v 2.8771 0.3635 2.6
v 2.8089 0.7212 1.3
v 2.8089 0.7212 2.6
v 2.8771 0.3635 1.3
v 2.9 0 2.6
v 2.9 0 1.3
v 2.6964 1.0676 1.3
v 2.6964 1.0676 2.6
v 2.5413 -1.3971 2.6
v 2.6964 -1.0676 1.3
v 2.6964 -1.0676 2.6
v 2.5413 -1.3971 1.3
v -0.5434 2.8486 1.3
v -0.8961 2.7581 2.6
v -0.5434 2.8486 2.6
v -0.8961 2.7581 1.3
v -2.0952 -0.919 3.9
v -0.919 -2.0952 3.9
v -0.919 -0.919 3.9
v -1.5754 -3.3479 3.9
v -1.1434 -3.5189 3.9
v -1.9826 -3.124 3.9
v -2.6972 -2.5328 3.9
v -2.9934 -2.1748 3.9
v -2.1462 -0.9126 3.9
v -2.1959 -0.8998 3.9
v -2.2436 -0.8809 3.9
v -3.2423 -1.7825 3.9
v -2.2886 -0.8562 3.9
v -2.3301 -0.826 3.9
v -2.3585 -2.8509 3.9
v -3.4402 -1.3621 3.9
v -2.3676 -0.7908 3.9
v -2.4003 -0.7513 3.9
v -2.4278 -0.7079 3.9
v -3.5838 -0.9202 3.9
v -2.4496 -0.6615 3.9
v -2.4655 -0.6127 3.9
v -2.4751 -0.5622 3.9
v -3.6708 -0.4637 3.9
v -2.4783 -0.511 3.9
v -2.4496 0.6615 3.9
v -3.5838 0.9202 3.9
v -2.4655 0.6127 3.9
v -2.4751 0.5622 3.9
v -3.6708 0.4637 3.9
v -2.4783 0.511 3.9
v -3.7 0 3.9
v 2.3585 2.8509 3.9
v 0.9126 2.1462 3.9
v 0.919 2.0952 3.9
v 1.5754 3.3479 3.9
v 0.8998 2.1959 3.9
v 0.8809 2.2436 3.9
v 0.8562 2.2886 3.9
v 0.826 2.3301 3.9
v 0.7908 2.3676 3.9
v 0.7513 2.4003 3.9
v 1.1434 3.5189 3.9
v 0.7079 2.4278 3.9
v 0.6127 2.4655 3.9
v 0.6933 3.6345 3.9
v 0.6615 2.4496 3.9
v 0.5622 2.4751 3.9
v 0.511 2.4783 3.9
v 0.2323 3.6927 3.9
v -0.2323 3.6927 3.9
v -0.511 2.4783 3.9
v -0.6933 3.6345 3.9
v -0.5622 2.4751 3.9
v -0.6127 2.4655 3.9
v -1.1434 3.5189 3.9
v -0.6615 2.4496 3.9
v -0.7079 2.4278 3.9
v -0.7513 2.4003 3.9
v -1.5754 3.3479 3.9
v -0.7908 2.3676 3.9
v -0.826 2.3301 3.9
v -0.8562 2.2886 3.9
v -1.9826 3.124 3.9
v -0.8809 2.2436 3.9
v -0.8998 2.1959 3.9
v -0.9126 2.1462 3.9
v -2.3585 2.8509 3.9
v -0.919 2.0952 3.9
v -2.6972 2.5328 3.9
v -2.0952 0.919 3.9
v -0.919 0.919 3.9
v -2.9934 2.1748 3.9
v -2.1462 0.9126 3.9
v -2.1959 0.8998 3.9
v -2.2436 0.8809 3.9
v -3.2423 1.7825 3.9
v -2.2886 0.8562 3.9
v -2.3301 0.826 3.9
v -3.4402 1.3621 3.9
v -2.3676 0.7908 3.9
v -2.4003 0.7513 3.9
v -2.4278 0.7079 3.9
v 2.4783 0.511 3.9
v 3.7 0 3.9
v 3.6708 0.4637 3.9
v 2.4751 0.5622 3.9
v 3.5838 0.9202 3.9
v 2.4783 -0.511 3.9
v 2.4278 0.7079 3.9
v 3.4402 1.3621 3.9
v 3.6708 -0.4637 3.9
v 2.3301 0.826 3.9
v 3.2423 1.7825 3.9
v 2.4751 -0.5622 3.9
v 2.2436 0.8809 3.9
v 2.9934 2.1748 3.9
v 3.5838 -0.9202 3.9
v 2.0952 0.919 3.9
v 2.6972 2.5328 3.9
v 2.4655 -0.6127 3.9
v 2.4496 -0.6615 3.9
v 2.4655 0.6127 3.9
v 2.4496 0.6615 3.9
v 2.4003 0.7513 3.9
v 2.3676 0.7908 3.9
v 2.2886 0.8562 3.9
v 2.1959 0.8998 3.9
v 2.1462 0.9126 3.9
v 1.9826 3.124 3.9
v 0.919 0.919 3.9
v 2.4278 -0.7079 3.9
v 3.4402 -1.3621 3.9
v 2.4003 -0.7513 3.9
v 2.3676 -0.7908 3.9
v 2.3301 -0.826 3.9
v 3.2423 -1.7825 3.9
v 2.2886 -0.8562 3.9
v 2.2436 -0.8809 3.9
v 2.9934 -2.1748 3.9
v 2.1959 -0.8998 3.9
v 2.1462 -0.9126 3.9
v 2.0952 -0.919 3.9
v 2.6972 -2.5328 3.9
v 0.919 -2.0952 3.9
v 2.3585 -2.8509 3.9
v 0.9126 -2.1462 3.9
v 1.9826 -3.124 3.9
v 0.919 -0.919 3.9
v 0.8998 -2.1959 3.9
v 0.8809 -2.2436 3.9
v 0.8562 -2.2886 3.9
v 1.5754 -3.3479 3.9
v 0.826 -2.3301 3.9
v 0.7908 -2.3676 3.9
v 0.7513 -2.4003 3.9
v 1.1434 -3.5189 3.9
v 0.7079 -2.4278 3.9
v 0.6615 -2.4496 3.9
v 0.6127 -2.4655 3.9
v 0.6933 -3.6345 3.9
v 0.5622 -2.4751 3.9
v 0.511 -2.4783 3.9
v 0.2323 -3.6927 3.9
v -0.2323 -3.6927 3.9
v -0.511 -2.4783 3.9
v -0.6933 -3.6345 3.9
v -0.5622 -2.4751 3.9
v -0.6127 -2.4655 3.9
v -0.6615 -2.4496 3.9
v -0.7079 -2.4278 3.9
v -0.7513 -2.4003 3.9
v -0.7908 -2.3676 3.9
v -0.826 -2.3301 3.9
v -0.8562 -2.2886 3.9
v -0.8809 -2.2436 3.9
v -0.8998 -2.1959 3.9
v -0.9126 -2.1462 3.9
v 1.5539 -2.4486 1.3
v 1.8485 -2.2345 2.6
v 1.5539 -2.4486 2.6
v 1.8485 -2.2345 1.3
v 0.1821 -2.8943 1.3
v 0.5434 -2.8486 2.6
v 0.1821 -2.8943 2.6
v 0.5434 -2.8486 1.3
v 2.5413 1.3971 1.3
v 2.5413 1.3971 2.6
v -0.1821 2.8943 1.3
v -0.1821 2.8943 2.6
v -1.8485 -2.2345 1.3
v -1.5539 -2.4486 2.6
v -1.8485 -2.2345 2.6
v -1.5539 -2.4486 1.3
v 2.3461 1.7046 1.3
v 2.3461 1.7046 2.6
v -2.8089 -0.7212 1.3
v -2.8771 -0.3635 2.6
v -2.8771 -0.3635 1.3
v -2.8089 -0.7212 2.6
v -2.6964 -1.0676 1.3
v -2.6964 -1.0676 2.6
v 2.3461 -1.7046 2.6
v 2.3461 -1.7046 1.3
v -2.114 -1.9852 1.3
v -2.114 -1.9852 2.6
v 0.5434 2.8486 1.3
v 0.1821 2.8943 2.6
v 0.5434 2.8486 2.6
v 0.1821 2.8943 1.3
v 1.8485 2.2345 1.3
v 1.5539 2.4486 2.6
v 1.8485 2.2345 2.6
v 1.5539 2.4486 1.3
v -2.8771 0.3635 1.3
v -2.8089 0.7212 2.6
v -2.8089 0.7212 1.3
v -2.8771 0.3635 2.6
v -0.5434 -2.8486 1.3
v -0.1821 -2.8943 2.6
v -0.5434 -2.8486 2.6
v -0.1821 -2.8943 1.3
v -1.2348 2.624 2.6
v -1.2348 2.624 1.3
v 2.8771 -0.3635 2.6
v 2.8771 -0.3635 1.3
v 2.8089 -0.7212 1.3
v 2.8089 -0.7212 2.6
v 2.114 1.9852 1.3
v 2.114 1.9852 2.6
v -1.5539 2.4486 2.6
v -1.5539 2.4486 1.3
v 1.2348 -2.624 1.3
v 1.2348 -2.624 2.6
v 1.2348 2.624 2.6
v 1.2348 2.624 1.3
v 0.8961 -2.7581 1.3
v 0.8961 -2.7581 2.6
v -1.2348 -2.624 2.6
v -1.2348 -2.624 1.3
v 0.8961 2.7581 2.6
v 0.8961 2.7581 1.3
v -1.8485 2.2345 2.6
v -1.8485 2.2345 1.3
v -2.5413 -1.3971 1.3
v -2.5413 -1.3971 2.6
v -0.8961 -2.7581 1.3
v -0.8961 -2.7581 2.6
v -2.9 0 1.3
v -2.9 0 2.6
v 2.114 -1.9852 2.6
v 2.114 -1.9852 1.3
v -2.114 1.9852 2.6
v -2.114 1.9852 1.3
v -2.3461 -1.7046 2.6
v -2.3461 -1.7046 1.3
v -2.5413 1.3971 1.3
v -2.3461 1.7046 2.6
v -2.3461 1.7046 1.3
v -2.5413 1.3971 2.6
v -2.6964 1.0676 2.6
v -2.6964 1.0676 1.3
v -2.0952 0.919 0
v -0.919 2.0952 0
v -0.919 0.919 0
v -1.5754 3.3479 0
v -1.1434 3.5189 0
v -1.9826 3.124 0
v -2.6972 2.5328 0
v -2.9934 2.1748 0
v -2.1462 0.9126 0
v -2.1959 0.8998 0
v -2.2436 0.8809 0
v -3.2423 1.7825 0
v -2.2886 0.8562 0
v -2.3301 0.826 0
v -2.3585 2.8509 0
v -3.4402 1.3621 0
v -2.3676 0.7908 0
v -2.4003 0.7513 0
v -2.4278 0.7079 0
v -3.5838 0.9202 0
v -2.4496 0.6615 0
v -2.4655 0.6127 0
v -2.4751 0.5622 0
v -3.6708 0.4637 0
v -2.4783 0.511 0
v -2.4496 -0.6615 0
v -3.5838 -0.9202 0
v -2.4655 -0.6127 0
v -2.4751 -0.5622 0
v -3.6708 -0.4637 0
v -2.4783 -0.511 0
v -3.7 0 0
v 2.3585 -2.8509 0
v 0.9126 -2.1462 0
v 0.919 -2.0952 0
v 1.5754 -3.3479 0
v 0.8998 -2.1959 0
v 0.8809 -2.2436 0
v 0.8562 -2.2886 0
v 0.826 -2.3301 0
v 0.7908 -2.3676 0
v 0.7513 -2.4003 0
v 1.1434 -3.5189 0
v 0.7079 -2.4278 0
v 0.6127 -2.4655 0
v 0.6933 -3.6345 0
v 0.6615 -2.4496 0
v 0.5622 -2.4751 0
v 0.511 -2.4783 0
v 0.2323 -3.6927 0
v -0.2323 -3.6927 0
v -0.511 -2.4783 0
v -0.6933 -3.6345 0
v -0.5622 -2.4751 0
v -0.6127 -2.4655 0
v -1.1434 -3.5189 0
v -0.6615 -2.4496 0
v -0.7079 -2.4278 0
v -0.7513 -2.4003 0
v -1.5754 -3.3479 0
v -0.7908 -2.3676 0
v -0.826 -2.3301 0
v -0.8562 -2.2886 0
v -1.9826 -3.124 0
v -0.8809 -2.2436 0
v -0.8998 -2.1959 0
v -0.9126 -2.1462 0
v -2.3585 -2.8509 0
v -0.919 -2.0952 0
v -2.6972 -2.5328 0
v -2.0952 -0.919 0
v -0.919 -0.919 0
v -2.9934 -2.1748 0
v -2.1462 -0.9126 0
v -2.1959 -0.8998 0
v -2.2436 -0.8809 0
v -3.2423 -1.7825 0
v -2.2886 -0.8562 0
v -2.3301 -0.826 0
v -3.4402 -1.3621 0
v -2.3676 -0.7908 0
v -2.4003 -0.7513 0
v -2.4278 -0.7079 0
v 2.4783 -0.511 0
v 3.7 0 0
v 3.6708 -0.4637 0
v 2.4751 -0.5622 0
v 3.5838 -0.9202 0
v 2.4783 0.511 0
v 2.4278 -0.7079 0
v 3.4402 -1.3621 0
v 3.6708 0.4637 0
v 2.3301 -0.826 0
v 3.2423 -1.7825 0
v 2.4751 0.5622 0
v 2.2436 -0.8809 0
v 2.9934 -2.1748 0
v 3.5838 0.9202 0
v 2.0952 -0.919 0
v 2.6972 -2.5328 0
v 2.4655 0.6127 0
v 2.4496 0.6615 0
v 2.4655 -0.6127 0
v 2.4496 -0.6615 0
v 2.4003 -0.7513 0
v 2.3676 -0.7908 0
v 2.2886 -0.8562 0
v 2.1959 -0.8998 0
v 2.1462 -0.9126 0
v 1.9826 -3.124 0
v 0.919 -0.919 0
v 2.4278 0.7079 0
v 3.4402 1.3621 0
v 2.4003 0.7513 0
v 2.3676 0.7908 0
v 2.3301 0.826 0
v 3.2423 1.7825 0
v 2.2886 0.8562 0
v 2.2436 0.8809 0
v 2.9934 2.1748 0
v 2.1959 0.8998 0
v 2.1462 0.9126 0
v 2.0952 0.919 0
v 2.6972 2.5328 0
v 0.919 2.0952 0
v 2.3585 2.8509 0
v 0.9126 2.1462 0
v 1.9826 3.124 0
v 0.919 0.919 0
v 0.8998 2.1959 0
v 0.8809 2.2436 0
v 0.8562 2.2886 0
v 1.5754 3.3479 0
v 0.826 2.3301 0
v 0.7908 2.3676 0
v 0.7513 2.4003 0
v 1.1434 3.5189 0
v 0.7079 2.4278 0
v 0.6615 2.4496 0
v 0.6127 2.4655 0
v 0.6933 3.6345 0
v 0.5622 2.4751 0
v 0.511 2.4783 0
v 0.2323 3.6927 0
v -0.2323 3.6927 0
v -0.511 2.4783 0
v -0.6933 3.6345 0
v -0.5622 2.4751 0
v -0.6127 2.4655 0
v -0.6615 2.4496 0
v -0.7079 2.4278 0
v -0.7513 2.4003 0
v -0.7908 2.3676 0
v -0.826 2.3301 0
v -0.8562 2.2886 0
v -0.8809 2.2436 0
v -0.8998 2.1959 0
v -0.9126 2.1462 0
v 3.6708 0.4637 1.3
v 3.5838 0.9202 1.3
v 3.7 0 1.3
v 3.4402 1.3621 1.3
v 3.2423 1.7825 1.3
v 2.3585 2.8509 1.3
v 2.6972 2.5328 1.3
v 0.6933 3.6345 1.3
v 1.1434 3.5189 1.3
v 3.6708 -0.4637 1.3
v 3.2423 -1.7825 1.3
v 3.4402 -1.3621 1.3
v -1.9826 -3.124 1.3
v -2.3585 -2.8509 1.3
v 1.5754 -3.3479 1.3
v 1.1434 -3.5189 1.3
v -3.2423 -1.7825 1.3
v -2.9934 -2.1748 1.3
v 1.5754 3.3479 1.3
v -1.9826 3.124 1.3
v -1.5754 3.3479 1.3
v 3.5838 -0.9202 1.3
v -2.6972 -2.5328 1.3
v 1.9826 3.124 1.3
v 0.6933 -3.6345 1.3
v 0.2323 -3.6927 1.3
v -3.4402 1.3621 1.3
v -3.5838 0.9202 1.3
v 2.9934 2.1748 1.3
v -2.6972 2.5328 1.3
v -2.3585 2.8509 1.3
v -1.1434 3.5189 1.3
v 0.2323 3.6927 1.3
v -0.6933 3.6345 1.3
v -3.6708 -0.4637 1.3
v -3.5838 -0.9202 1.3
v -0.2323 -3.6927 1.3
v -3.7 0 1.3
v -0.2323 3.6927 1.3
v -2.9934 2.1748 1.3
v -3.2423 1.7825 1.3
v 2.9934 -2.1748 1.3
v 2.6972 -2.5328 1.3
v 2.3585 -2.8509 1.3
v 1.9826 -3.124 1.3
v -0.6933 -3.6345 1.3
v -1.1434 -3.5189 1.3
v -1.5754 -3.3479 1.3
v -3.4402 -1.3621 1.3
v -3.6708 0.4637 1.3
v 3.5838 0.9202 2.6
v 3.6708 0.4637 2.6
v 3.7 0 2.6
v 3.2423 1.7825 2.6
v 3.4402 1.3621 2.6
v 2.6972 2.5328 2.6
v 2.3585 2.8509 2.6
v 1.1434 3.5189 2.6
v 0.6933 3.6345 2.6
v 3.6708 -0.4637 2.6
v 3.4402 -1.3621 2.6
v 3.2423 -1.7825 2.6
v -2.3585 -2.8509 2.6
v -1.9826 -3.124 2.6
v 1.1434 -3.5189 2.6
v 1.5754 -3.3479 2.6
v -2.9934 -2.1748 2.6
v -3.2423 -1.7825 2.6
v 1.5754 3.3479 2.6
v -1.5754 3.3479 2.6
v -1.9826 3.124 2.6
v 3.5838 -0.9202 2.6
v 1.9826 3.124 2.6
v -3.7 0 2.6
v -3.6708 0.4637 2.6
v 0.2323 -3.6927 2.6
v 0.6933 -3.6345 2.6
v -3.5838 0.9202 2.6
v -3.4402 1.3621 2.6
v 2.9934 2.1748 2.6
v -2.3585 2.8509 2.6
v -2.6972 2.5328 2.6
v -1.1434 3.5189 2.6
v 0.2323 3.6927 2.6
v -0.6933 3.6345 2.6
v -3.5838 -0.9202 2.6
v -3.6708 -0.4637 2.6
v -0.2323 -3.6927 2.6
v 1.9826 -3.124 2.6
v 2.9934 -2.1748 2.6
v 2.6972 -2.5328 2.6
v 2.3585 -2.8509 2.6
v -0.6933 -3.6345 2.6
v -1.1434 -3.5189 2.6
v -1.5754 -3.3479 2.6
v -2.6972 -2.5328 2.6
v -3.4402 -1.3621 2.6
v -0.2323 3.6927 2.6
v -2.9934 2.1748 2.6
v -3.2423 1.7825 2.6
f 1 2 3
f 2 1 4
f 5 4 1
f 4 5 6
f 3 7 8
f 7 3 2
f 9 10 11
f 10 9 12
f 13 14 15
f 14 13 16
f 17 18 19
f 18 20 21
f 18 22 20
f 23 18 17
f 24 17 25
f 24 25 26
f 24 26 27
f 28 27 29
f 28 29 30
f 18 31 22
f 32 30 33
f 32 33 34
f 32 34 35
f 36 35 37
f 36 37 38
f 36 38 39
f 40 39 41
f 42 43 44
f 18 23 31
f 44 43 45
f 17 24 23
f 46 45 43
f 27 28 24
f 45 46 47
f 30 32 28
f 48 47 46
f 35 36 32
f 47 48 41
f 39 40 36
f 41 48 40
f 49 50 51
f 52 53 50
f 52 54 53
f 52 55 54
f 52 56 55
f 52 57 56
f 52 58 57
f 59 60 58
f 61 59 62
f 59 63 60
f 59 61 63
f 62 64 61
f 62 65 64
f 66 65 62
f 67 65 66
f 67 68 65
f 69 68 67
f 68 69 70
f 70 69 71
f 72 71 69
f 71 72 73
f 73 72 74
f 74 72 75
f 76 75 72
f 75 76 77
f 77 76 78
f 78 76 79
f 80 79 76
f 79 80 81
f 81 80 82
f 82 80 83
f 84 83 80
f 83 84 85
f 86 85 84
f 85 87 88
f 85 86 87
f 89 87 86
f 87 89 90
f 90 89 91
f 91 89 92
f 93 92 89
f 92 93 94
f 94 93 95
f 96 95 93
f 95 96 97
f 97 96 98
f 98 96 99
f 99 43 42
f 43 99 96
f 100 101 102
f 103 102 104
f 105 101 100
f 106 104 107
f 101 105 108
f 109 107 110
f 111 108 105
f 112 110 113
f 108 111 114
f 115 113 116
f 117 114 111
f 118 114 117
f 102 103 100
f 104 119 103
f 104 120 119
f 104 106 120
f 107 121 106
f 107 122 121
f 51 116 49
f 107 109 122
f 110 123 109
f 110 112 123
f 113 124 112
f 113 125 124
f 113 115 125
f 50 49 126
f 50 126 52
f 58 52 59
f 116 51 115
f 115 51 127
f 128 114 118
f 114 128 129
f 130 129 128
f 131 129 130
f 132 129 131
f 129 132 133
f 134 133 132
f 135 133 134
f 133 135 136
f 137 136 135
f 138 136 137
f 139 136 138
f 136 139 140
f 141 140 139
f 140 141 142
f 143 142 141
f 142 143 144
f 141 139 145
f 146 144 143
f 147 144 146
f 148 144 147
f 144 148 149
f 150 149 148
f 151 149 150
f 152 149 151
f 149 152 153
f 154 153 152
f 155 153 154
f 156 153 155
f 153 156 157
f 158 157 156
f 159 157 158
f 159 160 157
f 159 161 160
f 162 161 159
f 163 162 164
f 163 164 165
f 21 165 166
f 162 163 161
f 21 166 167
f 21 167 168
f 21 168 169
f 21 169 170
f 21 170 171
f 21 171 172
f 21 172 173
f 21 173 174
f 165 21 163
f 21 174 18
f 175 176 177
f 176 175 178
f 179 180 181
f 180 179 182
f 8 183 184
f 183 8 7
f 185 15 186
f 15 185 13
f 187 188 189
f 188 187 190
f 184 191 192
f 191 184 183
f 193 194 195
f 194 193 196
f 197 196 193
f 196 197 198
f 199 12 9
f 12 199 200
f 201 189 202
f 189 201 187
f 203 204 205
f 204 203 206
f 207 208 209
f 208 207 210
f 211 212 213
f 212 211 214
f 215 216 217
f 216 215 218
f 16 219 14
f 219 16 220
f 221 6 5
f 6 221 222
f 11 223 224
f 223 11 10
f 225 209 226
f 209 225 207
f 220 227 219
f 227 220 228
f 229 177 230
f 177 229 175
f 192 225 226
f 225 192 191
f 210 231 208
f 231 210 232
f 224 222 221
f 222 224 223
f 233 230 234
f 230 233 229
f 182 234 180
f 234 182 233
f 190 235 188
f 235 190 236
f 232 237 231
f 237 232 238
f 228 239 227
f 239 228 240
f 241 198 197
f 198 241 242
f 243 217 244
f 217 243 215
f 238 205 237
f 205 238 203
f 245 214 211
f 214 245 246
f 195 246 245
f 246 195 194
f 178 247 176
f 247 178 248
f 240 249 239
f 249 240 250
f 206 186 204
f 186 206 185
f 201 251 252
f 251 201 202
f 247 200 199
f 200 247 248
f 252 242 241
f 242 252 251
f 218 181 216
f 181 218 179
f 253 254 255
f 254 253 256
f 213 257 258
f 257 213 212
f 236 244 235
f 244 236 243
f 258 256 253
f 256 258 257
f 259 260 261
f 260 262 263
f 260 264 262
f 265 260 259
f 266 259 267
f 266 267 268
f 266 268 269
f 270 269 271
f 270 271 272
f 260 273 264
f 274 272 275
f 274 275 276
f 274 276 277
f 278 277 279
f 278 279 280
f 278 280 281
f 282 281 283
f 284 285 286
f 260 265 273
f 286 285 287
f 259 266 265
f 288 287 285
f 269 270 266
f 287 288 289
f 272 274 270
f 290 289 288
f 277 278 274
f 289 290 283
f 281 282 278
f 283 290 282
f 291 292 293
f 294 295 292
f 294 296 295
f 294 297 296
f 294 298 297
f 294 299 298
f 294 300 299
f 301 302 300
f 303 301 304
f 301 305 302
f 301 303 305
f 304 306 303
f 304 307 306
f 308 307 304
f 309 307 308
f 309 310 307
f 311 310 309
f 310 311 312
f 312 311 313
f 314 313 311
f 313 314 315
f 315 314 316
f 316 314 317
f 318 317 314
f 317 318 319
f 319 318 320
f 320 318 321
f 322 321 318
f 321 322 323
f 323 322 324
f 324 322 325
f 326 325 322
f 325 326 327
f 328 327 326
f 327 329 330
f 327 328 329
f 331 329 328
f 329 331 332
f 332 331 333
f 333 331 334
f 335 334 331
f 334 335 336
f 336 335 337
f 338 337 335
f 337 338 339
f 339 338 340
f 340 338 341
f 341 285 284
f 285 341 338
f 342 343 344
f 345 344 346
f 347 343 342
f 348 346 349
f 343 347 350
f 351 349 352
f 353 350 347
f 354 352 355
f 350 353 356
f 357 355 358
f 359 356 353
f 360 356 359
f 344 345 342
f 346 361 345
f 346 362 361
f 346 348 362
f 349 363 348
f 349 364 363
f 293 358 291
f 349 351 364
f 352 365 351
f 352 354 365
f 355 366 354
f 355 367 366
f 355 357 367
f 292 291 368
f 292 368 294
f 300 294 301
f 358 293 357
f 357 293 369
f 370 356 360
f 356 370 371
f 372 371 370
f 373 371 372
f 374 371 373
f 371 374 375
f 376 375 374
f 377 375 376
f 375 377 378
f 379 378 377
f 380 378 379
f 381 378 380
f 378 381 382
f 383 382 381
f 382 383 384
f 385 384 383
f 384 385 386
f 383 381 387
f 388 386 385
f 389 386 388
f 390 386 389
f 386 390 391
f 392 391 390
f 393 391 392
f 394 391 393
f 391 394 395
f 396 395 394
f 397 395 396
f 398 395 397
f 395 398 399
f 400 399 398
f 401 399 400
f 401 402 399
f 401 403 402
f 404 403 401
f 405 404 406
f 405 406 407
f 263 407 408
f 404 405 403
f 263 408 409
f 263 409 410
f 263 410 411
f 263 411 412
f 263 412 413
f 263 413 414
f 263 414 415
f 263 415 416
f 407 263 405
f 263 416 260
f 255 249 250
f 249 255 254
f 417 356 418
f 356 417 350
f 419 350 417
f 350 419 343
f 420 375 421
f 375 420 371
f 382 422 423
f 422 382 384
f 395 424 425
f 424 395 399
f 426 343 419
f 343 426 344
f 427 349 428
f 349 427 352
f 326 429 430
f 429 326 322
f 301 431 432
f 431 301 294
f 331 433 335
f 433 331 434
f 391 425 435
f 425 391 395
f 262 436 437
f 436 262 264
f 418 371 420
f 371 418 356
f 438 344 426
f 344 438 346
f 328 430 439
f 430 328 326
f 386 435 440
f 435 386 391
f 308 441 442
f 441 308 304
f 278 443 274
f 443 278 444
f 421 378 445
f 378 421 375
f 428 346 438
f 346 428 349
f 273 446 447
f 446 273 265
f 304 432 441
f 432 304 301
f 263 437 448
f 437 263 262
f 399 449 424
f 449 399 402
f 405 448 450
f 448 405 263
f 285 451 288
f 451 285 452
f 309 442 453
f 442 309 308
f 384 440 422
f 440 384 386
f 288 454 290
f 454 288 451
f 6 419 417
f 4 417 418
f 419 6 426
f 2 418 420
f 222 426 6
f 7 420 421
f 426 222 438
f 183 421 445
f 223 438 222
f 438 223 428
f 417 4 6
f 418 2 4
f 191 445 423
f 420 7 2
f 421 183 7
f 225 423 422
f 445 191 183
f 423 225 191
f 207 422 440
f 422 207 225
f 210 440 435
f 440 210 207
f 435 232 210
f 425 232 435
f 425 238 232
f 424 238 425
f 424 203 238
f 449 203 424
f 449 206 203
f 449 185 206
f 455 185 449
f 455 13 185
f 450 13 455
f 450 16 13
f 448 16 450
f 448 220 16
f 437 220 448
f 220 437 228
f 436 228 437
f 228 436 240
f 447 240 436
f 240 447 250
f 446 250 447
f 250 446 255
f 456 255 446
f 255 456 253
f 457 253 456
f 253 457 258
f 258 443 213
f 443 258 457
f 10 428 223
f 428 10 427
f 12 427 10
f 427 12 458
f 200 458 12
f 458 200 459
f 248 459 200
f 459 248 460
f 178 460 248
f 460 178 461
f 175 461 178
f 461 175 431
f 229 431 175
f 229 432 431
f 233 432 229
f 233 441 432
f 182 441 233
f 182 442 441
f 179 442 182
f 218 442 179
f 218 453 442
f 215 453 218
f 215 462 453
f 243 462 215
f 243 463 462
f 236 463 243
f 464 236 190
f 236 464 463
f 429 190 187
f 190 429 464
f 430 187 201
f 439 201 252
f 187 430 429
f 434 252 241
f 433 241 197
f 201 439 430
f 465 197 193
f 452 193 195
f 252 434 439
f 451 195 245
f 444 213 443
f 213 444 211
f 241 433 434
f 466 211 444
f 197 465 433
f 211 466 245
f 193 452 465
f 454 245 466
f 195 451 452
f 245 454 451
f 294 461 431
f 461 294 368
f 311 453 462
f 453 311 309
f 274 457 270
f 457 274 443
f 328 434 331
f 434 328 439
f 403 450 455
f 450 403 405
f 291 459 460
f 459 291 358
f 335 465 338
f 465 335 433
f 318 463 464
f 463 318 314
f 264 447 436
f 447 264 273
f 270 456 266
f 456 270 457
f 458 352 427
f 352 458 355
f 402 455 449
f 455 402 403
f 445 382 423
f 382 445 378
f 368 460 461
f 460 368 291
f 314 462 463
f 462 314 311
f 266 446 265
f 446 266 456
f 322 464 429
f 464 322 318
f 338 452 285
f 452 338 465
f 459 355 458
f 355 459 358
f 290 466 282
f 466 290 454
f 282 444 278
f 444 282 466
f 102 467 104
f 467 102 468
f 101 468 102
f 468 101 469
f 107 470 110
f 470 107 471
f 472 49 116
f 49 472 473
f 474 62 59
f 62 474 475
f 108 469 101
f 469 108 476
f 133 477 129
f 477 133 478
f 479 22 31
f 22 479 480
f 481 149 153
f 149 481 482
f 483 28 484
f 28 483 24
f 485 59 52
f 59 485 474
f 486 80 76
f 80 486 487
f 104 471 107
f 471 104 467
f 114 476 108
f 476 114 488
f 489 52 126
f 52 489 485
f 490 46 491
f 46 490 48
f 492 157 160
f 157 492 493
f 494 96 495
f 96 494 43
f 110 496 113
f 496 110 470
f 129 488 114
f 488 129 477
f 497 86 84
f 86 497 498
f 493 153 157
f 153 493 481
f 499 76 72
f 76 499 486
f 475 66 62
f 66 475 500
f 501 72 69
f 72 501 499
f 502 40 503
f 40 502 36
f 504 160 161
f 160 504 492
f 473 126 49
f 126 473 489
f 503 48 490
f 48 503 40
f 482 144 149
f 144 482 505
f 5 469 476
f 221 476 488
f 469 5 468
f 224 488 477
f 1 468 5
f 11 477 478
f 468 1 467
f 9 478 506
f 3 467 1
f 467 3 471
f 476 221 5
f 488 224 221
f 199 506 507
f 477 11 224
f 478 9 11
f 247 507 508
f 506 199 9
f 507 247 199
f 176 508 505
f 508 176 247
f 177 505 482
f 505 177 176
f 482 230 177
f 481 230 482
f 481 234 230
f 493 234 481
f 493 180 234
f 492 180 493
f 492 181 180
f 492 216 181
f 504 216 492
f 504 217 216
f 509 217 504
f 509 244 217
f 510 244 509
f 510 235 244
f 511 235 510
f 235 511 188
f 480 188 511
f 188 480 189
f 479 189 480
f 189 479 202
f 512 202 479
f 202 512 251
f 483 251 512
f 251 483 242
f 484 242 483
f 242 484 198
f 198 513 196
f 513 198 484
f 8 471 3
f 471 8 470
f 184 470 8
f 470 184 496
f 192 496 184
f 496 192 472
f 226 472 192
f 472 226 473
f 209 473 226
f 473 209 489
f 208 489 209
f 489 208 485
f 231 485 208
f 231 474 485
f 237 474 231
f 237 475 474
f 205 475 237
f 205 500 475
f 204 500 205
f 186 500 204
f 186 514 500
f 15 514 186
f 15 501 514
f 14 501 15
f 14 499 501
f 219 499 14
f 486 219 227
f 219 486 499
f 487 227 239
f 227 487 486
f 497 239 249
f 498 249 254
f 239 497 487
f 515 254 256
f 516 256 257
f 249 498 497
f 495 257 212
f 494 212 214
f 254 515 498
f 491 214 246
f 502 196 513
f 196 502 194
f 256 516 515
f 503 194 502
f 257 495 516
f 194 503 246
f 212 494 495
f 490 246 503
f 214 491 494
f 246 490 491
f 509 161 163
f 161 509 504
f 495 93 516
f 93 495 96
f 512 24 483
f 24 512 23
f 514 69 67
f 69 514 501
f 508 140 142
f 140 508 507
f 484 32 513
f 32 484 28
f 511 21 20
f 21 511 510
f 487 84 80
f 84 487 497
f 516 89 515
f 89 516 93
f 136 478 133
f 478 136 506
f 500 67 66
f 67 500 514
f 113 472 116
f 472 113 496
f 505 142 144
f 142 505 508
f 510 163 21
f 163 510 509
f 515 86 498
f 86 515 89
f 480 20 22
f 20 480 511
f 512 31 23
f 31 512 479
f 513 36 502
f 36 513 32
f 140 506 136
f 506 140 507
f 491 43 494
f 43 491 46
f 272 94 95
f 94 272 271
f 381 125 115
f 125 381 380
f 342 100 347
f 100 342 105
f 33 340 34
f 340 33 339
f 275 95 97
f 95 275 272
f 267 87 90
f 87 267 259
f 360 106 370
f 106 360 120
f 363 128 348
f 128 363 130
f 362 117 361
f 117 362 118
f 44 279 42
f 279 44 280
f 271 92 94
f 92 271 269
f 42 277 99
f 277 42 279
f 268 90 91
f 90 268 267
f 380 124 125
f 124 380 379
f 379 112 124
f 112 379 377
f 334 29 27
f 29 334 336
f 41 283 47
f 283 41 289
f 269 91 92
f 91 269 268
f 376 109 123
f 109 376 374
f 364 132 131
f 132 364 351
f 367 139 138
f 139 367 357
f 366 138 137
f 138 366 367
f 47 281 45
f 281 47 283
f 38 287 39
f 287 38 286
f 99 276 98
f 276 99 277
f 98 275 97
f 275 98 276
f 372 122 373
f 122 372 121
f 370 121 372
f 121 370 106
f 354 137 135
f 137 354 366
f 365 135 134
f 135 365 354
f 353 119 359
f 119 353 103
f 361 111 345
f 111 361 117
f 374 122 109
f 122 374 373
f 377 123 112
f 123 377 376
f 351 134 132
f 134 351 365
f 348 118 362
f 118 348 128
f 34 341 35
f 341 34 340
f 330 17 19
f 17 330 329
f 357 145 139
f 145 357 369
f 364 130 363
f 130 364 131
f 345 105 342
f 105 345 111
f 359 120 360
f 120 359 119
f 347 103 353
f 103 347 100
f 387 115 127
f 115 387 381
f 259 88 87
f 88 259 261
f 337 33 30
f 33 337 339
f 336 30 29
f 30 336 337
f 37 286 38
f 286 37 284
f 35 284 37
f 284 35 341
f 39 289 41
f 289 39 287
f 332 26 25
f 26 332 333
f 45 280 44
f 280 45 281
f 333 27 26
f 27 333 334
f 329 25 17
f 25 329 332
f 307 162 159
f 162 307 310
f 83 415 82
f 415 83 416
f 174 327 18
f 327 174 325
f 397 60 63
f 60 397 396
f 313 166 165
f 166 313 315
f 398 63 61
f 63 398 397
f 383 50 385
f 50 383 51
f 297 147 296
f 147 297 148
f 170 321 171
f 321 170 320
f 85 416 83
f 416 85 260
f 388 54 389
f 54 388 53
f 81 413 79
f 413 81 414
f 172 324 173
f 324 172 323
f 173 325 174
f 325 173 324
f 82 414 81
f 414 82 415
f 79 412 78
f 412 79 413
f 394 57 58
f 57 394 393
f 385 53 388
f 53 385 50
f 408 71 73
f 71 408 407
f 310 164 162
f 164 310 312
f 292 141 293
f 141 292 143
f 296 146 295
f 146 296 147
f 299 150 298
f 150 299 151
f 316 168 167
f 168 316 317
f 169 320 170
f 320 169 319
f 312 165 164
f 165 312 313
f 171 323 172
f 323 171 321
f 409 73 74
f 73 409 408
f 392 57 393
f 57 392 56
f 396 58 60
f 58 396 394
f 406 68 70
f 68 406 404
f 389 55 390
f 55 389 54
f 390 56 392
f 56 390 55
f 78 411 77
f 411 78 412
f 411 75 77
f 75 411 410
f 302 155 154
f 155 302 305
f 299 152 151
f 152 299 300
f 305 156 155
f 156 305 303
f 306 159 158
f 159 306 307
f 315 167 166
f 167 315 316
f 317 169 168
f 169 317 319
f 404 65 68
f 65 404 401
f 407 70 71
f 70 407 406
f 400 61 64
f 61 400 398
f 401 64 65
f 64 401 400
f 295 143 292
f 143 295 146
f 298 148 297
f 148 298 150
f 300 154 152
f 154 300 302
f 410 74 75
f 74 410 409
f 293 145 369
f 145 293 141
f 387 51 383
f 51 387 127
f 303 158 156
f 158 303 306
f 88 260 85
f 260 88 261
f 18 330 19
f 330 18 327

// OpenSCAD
/**
 * LEGO and Technic are trademarks of the LEGO Group.
 *
 * For standard LEGO-compatible bricks, see LEGO.scad. This module
 * is specifically for parts without studs, like gears and axles.
 *
 * Copyright (c) 2025 Christopher Finke (cfinke@gmail.com)
 *
 * Permission is hereby granted, free of charge, to any person obtaining
 * a copy of this software and associated documentation files (the
 * "Software"), to deal in the Software without restriction, including
 * without limitation the rights to use, copy, modify, merge, publish,
 * distribute, sublicense, and/or sell copies of the Software, and to
 * permit persons to whom the Software is furnished to do so, subject to
 * the following conditions:
 *
 * The above copyright notice and this permission notice shall be
 * included in all copies or substantial portions of the Software.
 *
 * THE SOFTWARE IS PROVIDED "AS IS", WITHOUT WARRANTY OF ANY KIND,
 * EXPRESS OR IMPLIED, INCLUDING BUT NOT LIMITED TO THE WARRANTIES OF
 * MERCHANTABILITY, FITNESS FOR A PARTICULAR PURPOSE AND
 * NONINFRINGEMENT. IN NO EVENT SHALL THE AUTHORS OR COPYRIGHT HOLDERS BE
 * LIABLE FOR ANY CLAIM, DAMAGES OR OTHER LIABILITY, WHETHER IN AN ACTION
 * OF CONTRACT, TORT OR OTHERWISE, ARISING FROM, OUT OF OR IN CONNECTION
 * WITH THE SOFTWARE OR THE USE OR OTHER DEALINGS IN THE SOFTWARE.
 */

include <Technic.scad>;

color( "yellow" ) technic_bush( height = 1 / 2 );
